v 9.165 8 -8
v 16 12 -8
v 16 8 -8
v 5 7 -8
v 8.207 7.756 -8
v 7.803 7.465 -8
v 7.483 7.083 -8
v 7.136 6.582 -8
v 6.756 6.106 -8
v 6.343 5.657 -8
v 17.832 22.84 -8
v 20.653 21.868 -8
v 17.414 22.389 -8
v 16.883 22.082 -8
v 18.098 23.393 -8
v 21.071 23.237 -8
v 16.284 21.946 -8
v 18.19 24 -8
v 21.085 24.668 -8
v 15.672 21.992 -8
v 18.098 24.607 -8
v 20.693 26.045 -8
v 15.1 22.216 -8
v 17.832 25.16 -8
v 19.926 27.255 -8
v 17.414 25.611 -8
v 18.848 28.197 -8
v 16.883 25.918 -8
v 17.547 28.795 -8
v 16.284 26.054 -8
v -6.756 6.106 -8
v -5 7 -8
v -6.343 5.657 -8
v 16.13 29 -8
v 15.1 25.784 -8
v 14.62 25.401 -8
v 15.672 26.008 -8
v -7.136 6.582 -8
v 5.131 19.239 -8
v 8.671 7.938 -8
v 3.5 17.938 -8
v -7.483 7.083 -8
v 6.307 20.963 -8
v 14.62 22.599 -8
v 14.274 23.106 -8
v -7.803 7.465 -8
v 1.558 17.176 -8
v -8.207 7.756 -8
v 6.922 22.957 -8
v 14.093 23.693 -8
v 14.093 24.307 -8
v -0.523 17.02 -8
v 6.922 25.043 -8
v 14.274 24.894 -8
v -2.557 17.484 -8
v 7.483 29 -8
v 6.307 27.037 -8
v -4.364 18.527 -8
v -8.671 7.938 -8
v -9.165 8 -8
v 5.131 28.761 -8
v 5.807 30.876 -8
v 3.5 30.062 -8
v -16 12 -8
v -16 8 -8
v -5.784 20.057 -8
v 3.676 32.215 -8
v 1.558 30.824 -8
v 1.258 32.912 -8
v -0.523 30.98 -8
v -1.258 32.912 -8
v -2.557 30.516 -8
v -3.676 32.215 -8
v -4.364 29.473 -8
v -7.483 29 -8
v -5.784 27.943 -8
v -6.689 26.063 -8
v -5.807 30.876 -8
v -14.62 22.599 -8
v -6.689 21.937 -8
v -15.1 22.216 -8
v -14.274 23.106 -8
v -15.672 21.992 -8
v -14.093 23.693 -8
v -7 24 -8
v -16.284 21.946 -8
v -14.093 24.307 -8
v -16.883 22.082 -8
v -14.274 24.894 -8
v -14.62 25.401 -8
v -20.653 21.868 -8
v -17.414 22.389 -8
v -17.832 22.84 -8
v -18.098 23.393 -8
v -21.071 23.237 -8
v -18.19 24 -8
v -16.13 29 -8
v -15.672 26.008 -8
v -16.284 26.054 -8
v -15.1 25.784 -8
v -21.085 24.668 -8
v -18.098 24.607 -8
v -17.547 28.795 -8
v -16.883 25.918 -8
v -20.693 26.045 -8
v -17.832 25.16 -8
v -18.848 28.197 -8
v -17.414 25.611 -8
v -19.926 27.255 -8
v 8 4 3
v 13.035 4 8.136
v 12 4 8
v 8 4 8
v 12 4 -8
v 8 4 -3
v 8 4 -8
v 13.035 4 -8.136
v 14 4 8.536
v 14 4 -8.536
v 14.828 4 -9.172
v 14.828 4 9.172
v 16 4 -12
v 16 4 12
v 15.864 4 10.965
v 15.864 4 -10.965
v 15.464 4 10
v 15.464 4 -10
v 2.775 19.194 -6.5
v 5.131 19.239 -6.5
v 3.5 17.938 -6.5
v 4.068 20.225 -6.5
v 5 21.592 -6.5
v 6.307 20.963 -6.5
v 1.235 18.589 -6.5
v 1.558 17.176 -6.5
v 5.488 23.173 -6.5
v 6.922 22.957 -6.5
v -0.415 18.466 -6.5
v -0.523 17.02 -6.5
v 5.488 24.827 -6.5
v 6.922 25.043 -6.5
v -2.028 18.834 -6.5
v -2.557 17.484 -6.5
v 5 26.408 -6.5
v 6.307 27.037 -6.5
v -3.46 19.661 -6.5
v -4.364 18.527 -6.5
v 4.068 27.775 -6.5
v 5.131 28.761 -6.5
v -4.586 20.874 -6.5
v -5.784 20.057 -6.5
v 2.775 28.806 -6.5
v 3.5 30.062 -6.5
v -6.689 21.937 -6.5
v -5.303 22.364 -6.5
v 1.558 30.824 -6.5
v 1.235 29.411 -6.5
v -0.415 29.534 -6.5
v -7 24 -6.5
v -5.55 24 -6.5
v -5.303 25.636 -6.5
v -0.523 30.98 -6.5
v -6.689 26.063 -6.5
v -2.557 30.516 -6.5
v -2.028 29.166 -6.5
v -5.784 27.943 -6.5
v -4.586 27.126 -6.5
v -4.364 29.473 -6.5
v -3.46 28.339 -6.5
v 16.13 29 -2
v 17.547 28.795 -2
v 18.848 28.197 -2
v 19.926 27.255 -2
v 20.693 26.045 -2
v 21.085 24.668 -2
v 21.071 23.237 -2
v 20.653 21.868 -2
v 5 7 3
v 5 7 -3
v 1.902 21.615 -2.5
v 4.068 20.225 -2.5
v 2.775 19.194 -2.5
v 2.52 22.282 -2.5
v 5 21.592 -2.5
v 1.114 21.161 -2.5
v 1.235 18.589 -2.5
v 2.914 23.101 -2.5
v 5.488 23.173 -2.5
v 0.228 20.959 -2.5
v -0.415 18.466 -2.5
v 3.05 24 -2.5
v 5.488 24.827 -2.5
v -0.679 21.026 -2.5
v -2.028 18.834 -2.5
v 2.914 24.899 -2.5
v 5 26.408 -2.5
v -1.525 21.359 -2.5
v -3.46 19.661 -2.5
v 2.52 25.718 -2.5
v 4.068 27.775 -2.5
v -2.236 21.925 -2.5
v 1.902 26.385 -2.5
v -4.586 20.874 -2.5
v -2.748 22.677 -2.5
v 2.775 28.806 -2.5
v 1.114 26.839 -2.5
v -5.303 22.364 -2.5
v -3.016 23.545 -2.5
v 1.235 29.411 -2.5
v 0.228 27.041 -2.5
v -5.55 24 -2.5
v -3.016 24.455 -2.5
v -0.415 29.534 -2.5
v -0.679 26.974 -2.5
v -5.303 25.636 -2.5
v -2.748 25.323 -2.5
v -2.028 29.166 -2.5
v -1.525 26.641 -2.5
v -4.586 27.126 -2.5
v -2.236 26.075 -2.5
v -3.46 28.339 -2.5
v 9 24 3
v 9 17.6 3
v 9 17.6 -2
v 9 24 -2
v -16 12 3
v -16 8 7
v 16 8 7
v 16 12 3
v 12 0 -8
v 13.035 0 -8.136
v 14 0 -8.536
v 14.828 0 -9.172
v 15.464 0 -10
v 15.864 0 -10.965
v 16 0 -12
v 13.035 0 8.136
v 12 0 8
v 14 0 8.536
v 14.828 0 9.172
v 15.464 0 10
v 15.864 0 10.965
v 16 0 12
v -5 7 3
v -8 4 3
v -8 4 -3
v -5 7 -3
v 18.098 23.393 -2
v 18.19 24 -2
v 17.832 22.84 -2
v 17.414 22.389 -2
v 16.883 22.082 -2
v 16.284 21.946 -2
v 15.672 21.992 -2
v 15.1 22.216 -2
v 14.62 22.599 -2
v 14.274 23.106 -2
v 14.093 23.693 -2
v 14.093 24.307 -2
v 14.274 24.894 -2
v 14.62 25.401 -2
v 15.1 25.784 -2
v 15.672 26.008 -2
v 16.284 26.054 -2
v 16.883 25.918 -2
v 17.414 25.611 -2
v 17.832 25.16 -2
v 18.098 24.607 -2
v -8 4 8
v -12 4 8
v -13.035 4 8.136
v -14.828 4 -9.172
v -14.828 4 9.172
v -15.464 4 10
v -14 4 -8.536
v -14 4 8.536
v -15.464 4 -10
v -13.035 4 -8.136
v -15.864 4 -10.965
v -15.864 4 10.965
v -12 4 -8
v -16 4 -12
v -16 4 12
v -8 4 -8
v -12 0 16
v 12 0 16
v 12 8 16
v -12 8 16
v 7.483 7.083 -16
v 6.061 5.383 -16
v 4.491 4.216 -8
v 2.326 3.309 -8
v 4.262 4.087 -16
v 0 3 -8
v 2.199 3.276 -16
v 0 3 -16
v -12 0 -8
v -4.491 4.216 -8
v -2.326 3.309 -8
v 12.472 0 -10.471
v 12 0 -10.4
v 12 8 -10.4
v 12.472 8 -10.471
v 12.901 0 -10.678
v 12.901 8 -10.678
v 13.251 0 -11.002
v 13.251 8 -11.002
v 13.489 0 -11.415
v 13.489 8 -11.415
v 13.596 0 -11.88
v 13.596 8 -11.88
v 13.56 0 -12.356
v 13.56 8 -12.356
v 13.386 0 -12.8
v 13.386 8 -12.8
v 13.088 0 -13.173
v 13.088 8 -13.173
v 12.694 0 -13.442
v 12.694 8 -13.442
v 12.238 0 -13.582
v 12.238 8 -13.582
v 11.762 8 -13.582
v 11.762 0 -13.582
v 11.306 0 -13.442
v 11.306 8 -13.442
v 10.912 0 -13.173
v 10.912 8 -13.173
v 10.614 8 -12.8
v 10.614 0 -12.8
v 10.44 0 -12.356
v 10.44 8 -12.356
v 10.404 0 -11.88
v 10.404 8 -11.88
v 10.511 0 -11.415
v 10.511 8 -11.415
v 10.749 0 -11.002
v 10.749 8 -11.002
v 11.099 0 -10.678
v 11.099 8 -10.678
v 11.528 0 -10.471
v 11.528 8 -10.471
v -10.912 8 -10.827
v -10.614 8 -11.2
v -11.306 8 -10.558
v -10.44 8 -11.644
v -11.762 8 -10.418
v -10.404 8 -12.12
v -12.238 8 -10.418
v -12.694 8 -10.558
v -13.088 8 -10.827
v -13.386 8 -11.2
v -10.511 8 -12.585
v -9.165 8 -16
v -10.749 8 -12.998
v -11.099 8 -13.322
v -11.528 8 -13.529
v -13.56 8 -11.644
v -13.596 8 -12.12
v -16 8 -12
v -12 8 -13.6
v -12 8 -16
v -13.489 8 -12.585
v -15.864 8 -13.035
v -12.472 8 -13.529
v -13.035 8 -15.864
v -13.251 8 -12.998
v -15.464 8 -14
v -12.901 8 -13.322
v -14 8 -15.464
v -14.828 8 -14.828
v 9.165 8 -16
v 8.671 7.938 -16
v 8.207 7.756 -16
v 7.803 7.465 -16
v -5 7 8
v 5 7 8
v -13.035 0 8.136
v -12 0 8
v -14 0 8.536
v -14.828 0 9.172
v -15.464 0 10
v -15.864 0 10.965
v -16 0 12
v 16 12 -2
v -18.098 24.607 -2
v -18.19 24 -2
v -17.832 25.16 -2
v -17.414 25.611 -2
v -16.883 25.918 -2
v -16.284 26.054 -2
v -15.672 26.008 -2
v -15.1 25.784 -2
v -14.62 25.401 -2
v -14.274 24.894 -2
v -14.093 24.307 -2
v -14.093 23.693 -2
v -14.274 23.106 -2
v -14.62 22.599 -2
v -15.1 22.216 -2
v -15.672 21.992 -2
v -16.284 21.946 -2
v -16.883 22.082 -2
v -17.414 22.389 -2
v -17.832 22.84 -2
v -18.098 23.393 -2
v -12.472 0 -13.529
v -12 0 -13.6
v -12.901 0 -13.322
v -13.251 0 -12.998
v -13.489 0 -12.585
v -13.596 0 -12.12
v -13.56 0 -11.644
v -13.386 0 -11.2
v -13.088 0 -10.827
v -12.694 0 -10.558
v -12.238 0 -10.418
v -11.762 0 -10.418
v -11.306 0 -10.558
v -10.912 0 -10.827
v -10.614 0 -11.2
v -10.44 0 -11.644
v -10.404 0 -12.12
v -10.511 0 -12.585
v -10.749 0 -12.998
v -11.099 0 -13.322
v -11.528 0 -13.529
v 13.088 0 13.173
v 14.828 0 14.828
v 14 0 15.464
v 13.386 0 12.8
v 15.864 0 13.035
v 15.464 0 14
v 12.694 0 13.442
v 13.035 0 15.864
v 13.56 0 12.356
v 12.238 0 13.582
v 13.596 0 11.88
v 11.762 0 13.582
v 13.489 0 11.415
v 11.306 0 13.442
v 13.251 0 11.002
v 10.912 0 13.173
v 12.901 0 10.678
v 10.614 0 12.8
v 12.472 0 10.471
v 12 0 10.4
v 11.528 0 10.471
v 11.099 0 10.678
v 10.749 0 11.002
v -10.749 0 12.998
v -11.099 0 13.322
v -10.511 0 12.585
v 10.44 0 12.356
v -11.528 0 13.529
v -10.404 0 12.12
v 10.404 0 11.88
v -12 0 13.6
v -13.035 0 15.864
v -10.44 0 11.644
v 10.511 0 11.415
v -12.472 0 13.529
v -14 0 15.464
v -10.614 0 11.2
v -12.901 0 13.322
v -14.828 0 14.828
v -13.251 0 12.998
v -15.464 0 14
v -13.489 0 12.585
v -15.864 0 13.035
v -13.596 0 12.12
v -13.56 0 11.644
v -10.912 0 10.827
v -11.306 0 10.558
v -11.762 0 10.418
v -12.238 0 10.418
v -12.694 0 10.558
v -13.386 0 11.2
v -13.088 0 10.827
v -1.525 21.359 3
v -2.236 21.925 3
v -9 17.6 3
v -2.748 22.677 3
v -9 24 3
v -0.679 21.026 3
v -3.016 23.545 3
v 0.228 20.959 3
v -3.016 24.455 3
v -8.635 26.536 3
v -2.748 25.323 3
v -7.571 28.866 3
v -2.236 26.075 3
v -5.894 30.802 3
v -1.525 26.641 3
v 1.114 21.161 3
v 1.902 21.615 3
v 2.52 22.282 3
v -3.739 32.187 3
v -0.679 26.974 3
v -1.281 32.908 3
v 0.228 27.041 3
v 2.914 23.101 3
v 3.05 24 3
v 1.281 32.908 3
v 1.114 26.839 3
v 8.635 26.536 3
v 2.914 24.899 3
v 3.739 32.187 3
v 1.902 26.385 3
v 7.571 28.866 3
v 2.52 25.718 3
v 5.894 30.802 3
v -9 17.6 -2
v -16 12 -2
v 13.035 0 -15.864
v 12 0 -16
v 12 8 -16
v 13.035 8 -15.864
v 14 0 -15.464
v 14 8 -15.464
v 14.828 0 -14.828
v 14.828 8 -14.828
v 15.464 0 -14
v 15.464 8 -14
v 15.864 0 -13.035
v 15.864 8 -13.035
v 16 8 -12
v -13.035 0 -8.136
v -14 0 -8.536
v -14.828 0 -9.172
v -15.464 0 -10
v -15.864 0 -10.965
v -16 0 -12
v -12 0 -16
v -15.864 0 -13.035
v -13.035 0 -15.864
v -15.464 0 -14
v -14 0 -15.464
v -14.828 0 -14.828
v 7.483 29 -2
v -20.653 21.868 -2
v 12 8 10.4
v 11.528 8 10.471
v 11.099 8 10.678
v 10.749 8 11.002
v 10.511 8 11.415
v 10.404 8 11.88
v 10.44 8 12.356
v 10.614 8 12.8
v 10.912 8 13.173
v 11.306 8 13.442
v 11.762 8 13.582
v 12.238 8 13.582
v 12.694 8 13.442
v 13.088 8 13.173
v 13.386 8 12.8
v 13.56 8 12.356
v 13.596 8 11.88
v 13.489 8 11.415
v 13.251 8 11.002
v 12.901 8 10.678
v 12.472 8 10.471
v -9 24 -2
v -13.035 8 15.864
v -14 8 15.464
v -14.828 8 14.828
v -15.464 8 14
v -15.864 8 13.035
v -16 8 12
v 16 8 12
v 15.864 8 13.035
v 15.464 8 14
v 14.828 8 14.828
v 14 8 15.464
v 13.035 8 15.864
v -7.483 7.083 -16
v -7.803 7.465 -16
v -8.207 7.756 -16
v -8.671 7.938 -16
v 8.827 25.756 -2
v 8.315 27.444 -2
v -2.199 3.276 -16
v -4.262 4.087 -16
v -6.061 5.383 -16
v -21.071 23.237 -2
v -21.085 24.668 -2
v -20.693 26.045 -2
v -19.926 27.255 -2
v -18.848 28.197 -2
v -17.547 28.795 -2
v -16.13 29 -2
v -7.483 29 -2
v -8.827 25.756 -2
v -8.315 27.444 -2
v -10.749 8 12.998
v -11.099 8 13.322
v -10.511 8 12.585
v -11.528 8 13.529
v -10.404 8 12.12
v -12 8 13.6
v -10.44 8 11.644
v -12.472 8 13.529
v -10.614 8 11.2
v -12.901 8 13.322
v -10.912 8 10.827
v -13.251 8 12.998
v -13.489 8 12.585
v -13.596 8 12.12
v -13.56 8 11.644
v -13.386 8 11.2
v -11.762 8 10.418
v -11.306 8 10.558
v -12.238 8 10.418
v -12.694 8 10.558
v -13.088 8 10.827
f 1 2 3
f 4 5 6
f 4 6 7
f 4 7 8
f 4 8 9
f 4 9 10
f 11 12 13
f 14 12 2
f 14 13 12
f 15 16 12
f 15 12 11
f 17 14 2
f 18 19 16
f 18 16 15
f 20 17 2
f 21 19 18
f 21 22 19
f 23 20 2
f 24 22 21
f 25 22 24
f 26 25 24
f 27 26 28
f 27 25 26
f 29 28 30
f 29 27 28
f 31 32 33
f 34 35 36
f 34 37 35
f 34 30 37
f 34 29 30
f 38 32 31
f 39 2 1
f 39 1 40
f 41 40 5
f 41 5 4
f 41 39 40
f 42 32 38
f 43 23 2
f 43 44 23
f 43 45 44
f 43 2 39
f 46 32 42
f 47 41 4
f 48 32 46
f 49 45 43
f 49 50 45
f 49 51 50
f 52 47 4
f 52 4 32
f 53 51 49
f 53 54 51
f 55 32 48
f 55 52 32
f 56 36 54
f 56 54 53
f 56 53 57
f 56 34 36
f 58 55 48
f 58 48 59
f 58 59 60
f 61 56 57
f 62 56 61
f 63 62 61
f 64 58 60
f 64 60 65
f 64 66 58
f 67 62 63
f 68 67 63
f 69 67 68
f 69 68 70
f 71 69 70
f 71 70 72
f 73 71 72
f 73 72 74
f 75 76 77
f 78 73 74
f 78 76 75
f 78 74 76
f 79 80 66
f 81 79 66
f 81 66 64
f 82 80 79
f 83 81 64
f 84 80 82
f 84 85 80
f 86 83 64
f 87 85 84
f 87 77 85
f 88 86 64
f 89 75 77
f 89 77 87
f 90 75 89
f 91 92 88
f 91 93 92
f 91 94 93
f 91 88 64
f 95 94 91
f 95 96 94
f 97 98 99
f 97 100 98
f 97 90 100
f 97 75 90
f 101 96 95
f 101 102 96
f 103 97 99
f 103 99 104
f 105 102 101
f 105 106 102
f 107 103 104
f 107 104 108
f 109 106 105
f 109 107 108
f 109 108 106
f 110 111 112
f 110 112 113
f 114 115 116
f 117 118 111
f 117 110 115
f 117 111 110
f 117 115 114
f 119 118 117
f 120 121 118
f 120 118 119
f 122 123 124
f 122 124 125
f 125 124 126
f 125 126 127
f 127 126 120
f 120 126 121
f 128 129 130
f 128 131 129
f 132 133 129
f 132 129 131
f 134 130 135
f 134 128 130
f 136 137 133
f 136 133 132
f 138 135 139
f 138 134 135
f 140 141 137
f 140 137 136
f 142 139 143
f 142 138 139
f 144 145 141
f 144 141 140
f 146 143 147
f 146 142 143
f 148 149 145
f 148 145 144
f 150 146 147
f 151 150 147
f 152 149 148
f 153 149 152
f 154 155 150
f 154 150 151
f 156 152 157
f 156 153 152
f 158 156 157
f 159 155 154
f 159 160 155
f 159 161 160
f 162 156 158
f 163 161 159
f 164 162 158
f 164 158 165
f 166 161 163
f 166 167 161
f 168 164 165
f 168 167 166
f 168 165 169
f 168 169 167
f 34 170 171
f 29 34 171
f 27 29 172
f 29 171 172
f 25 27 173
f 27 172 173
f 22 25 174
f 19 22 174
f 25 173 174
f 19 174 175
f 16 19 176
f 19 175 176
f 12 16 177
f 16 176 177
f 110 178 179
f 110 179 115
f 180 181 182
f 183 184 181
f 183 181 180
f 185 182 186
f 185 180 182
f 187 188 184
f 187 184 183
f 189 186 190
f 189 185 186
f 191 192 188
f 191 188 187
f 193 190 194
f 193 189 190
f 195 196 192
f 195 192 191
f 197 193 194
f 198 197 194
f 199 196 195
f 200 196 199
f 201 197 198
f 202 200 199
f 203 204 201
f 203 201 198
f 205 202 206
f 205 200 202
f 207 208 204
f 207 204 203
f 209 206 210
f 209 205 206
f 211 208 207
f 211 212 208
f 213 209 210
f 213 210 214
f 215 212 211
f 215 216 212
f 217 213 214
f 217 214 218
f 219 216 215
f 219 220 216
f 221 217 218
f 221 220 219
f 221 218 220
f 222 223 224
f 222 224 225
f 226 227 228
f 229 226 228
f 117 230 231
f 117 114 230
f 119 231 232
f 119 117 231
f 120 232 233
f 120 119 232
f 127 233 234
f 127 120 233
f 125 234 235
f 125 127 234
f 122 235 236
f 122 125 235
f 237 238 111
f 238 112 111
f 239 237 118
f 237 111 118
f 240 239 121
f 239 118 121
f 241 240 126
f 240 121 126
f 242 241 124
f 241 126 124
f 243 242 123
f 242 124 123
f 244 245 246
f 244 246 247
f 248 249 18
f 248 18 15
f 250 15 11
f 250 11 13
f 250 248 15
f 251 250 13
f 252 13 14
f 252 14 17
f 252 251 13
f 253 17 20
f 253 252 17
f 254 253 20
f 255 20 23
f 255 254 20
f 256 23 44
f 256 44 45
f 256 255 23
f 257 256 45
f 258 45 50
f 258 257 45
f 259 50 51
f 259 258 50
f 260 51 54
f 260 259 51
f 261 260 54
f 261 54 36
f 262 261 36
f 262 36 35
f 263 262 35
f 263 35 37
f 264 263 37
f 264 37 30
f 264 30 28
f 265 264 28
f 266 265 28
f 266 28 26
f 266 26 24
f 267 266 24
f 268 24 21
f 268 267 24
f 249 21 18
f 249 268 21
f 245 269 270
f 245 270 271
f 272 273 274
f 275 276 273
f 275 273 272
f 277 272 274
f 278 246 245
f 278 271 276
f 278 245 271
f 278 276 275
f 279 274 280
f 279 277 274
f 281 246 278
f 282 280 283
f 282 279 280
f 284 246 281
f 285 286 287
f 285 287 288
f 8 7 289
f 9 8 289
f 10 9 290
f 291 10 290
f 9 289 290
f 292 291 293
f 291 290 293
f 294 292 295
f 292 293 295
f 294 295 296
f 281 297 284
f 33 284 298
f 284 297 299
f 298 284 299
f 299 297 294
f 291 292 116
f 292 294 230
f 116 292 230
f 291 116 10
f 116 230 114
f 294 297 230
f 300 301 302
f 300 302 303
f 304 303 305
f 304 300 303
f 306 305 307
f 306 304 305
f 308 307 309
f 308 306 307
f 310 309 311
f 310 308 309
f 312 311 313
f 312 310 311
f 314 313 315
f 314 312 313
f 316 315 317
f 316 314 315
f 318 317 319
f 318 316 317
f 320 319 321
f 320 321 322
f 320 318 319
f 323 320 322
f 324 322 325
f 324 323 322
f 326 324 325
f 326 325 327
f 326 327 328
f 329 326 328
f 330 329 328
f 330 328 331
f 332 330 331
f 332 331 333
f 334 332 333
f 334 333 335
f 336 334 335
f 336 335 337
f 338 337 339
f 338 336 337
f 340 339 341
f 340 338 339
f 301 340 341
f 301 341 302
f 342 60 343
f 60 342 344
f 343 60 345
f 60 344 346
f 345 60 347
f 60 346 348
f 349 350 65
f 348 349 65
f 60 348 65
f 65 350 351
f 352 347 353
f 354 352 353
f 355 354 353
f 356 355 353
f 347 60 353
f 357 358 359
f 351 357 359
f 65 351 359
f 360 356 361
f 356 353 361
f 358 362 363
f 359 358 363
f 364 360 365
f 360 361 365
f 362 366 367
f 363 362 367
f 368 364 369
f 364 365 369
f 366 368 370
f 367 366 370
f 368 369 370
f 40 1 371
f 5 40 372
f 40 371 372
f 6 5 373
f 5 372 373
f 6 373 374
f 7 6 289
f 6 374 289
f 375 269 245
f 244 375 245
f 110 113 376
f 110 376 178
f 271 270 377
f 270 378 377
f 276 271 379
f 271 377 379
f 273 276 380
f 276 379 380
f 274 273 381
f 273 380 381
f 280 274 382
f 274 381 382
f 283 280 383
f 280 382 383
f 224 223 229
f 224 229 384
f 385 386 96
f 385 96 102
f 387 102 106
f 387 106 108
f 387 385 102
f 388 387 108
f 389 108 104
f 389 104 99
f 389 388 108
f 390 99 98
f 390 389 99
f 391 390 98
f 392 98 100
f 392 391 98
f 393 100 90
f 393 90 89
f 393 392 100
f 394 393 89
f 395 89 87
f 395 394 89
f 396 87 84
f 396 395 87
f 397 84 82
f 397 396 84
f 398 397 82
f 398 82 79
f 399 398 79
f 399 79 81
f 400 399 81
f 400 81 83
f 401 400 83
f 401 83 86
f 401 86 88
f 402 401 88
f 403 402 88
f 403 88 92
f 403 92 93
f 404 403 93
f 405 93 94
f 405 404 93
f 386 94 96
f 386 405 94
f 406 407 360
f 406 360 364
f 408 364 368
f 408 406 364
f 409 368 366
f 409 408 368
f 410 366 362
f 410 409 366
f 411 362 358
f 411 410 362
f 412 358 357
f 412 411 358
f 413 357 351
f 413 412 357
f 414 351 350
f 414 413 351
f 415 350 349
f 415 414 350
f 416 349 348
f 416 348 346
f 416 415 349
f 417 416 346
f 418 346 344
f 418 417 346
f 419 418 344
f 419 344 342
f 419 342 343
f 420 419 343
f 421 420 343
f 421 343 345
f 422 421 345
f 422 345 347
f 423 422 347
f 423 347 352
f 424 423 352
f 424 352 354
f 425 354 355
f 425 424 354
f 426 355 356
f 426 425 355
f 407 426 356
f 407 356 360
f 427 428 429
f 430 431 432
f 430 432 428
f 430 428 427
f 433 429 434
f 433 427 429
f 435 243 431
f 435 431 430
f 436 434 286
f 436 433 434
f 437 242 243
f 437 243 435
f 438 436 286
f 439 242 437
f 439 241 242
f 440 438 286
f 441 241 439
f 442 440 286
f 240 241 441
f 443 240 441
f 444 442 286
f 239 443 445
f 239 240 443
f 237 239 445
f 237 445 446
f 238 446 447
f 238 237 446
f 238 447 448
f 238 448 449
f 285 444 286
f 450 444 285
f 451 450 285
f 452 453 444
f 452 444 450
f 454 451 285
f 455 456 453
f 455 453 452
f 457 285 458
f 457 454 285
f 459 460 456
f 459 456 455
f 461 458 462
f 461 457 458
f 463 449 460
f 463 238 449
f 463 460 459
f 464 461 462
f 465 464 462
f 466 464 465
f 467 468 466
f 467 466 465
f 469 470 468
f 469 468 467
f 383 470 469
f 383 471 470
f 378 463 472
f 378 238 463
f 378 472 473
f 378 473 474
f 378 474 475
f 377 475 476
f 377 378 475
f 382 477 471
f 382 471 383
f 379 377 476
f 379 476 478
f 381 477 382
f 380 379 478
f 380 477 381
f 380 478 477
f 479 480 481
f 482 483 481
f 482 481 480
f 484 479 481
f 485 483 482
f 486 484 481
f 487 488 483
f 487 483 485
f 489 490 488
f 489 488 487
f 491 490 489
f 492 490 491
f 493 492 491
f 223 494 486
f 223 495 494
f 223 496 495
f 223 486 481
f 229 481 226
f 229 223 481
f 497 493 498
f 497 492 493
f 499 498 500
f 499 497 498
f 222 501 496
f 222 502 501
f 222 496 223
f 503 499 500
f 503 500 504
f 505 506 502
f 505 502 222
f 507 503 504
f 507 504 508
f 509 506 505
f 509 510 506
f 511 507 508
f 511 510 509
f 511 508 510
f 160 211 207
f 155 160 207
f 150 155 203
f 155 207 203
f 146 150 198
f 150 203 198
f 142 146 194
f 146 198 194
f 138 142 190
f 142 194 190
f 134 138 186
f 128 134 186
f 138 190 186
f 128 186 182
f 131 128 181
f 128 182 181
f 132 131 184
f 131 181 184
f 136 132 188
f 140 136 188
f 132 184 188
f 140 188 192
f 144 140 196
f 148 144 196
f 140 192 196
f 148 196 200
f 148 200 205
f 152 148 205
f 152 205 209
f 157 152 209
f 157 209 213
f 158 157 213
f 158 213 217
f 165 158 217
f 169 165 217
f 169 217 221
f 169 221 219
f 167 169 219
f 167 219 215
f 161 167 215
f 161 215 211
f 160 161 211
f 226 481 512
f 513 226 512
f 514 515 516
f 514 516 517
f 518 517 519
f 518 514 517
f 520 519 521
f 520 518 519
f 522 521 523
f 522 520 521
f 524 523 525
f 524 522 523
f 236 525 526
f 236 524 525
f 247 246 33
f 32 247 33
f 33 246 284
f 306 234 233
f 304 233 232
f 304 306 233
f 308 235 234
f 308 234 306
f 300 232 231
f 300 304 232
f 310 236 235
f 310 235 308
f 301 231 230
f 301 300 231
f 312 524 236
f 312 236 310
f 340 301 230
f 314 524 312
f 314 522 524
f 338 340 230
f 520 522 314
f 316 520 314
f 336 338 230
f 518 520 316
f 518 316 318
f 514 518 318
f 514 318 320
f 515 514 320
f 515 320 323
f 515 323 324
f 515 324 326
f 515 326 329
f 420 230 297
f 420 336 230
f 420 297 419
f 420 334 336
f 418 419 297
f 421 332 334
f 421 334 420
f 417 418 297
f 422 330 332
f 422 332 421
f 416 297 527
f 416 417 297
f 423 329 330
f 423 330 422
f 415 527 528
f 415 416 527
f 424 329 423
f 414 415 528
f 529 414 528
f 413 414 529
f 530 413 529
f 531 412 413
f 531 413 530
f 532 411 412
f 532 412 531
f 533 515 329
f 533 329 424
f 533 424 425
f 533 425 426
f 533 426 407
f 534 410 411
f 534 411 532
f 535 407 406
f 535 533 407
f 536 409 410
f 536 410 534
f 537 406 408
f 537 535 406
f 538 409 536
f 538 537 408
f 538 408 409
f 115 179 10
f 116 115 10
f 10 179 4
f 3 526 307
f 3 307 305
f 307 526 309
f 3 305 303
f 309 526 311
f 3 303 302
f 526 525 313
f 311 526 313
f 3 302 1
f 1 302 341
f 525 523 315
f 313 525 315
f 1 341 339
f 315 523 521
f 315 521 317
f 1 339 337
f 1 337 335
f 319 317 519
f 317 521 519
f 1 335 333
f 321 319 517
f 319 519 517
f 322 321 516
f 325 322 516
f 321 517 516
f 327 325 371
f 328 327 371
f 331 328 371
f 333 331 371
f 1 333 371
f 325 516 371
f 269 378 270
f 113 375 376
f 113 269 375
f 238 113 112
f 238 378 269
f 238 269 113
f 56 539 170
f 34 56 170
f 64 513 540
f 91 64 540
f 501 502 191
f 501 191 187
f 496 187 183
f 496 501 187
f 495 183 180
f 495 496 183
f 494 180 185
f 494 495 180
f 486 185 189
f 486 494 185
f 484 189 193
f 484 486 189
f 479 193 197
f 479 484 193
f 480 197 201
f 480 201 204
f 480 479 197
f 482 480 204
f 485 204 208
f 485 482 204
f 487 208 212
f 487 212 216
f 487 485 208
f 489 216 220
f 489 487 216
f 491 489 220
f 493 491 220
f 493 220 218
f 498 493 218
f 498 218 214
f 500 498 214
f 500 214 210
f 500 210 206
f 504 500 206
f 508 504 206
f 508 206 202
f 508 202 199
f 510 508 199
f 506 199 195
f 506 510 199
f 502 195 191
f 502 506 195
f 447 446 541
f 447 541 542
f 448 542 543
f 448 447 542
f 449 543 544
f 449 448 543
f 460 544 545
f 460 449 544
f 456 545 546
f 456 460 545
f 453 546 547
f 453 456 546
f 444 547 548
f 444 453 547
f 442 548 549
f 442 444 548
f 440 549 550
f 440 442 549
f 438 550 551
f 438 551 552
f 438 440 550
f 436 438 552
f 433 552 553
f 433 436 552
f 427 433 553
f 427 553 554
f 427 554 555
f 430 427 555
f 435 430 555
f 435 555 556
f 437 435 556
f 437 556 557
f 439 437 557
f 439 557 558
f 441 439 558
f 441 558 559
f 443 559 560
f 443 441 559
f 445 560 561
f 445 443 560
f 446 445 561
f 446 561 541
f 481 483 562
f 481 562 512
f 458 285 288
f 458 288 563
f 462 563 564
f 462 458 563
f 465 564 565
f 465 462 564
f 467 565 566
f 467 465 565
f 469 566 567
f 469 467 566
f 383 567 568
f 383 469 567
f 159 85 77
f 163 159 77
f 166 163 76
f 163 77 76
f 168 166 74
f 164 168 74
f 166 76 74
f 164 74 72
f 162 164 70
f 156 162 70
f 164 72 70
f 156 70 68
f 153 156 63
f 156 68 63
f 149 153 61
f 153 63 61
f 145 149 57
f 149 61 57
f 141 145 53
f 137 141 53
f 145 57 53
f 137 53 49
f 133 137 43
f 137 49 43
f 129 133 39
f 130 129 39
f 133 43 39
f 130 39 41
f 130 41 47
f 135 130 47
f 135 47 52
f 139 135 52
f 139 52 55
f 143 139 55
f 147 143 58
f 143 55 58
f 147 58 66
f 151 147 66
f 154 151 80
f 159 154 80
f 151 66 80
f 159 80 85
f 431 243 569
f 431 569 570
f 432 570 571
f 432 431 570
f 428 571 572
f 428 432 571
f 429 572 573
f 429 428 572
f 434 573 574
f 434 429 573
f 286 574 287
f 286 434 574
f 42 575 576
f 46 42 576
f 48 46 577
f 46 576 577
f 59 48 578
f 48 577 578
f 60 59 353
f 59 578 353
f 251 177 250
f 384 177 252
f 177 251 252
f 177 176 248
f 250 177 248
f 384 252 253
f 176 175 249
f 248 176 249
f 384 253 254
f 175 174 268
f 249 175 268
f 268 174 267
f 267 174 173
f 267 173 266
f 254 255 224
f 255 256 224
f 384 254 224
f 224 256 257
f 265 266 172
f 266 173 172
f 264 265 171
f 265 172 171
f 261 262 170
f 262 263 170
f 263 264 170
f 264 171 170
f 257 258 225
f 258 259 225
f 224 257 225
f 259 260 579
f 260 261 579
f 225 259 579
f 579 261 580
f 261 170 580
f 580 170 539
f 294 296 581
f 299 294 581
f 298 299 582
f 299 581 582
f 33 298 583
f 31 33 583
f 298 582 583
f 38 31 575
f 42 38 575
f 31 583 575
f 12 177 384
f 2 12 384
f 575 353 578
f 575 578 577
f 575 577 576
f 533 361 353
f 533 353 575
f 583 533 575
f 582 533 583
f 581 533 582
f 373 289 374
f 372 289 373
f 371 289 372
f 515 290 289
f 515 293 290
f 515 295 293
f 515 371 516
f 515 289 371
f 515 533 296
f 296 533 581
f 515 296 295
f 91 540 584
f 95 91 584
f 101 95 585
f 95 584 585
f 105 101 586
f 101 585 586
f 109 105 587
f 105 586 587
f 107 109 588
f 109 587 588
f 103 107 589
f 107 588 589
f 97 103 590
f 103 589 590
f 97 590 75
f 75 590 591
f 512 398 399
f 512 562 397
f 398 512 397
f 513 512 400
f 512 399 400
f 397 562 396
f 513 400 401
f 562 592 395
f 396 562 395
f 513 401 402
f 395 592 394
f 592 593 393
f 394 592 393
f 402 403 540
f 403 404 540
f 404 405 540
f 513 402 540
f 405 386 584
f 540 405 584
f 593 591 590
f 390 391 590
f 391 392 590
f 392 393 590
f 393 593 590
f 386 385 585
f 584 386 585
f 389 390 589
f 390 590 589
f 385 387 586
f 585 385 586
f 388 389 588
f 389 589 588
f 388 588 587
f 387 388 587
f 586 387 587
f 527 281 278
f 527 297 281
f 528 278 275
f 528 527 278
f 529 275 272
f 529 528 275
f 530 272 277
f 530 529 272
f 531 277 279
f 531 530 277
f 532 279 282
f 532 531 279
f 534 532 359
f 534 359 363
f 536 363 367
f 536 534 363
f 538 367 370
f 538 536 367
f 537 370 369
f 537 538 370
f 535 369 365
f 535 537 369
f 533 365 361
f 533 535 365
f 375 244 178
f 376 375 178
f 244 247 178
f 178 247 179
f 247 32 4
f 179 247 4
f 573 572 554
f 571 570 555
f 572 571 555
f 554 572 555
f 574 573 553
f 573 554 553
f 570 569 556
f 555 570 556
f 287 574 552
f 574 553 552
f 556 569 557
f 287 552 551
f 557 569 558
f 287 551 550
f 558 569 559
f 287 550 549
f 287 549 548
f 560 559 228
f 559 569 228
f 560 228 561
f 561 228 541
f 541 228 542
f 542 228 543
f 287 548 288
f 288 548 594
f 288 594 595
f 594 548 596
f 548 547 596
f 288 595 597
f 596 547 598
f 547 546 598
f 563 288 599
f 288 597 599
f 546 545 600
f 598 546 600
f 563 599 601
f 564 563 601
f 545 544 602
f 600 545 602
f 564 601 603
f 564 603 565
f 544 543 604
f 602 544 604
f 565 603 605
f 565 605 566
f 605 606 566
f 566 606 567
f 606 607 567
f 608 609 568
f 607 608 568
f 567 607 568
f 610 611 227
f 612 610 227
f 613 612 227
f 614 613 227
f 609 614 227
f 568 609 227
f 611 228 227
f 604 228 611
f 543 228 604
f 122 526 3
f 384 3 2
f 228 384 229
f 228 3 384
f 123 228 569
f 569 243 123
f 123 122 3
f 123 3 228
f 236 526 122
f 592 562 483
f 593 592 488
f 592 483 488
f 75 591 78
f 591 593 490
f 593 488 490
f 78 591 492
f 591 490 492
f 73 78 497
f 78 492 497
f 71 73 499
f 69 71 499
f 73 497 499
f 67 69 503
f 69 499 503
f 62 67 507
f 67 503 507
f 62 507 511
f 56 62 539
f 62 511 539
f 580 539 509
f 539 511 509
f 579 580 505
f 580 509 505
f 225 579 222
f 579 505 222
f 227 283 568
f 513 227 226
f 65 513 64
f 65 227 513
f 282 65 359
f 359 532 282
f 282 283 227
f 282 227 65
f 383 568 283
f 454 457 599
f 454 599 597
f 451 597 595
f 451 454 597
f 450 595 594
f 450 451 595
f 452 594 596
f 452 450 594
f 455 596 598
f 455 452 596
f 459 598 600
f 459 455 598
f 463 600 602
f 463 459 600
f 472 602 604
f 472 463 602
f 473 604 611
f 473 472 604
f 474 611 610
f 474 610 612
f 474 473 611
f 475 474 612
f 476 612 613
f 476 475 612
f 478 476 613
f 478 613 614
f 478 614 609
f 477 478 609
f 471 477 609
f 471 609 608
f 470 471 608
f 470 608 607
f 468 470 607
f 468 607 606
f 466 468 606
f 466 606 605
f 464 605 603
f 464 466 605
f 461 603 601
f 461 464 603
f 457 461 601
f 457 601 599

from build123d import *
from OCP.BRepFilletAPI import BRepFilletAPI_MakeChamfer
from build123d.topology import SkipClean

# Parameters (mm, degrees)
SKETCH1_R                = 1.6
SKETCH1_W                = 16
SKETCH1_H                = 16
BOSS_EXTRUDE1_DEPTH      = 8
SKETCH2_W                = 16
SKETCH2_H                = 4
CUT_EXTRUDE1_DEPTH       = 40
FILLET1_R                = 4
BOSS_EXTRUDE5_DEPTH      = 12
BOSS_EXTRUDE5_DEPTH_BACK = 1
SKETCH3_W                = 32
SKETCH3_H                = 5
CHAMFER1_SIZE            = 3
CHAMFER2_SIZE            = 8
CHAMFER2_SIZE2           = 10
SKETCH5_W                = 12
SKETCH5_H                = 5
BOSS_EXTRUDE7_DEPTH      = 8
FILLET2_R                = 4
SKETCH6_R                = 1.6
CUT_EXTRUDE2_DEPTH       = 20
SKETCH7_R                = 3.05
CUT_EXTRUDE3_DEPTH       = 9
SKETCH8_R                = 3.05
BOSS_EXTRUDE8_DEPTH      = 5
BOSS_EXTRUDE9_START      = -5
SKETCH9_R                = 1.6
BOSS_EXTRUDE9_DEPTH      = 5
SKETCH10_R               = 5.55
CUT_EXTRUDE4_DEPTH       = 9
BOSS_EXTRUDE11_START     = 6
SKETCH11_R               = 5.55
BOSS_EXTRUDE11_DEPTH     = 6
SKETCH12_R               = 7.71946315
SKETCH12_R_2             = 3.05
BOSS_EXTRUDE12_DEPTH     = 5.5
SKETCH14_R               = 7
CUT_EXTRUDE6_DEPTH       = 1.5
CUT_EXTRUDE8_DEPTH       = 5
BOSS_EXTRUDE13_START     = -6
SKETCH19_R               = 2.06
SKETCH19_R_2             = 7
BOSS_EXTRUDE13_DEPTH     = 6
CUT_EXTRUDE9_DEPTH       = 8
FILLET3_R                = 2
CHAMFER3_SIZE            = 4


# Some blends are built 0.0001 mm under size
with BuildPart() as part:
    # Sketch1 → Boss-Extrude1 (new body)
    with BuildSketch(Plane(origin=(0, 0, 0), x_dir=(1, 0, 0), z_dir=(0, 1, 0))):
        with BuildLine():
            Line((-12, 16), (12, 16))
            ThreePointArc((12, 16), (14.828427125, 14.828427125), (16, 12))
            Line((16, 12), (16, -12))
            ThreePointArc((16, -12), (14.828427125, -14.828427125), (12, -16))
            Line((12, -16), (-12, -16))
            ThreePointArc((-12, -16), (-14.828427125, -14.828427125), (-16, -12))
            Line((-16, -12), (-16, 12))
            ThreePointArc((-16, 12), (-14.828427125, 14.828427125), (-12, 16))
        make_face()
        with Locations(Location((12, 12, 0), (0, 0, 270))):
            Circle(SKETCH1_R, mode=Mode.SUBTRACT)
        with Locations(Location((-12, 12, 0), (0, 0, 90))):
            Circle(SKETCH1_R, mode=Mode.SUBTRACT)
        with Locations(Location((12, -12, 0), (0, 0, 90))):
            Circle(SKETCH1_R, mode=Mode.SUBTRACT)
        with Locations(Location((-12, -12, 0), (0, 0, 270))):
            Circle(SKETCH1_R, mode=Mode.SUBTRACT)
        Rectangle(SKETCH1_W, SKETCH1_H, mode=Mode.SUBTRACT)
    extrude(amount=BOSS_EXTRUDE1_DEPTH)

    # Sketch2 → Cut-Extrude1 (cut)
    with BuildSketch(Plane(origin=(16, 0, 0), x_dir=(0, 0, -1), z_dir=(1, 0, 0))):
        with Locations((0, 2)):
            Rectangle(SKETCH2_W, SKETCH2_H)
    extrude(amount=-CUT_EXTRUDE1_DEPTH, mode=Mode.SUBTRACT)

    # Fillet1
    fillet1_edges = [part.edges().sort_by_distance(p)[0] for p in [
        (-16, 2, -8),
        (16, 2, -8),
        (-16, 2, 8),
        (16, 2, 8),
    ]]
    fillet(fillet1_edges, radius=FILLET1_R - 0.0001)  # a hair under: the kernel refuses the full size

    # Sketch3 → Boss-Extrude5 (add, two sides: drawn at the far end of the back side and taken through both)
    with BuildSketch(Plane(origin=(0, 8, 0), x_dir=(1, 0, 0), z_dir=(0, 1, 0)).offset(-BOSS_EXTRUDE5_DEPTH_BACK)):
        with Locations((0, 5.5)):
            Rectangle(SKETCH3_W, SKETCH3_H)
        with Locations((0, -5.5)):
            Rectangle(SKETCH3_W, SKETCH3_H)
    extrude(amount=BOSS_EXTRUDE5_DEPTH + BOSS_EXTRUDE5_DEPTH_BACK)

    # Chamfer1
    chamfer1_edges = [part.edges().sort_by_distance(p)[0] for p in [
        (8, 7, 5.5),
        (8, 7, -5.5),
        (-8, 7, -5.5),
        (-8, 7, 5.5),
    ]]
    chamfer(chamfer1_edges, length=CHAMFER1_SIZE - 0.0001)  # a hair under: the kernel refuses the full size

    # Chamfer2: one chamfer whose edges measure the first distance from different faces: ONE call of the kernel's chamfer builder (chamfer() names one face for all edges)
    chamfer2_edges_1 = [part.edges().sort_by_distance(p)[0] for p in [
        (-16, 20, -5.5),
        (-16, 20, 5.5),
    ]]
    chamfer2_side_1 = [part.faces().sort_by_distance(p)[0] for p in [
        (-16, 0.312409987, 11.99995),
    ]]
    chamfer2_edges_2 = [part.edges().sort_by_distance(p)[0] for p in [
        (16, 20, -5.5),
        (16, 20, 5.5),
    ]]
    chamfer2_side_2 = [part.faces().sort_by_distance(p)[0] for p in [
        (16, 0.312409987, -11.99995),
    ]]
    chamfer2 = BRepFilletAPI_MakeChamfer(part.part.solid().wrapped)
    for e in chamfer2_edges_1:
        chamfer2.Add(CHAMFER2_SIZE, CHAMFER2_SIZE2, e.wrapped, chamfer2_side_1[0].wrapped)  # the first distance lies on this face
    for e in chamfer2_edges_2:
        chamfer2.Add(CHAMFER2_SIZE, CHAMFER2_SIZE2, e.wrapped, chamfer2_side_2[0].wrapped)  # the first distance lies on this face
    add(Compound.cast(chamfer2.Shape()), mode=Mode.REPLACE)

    # Sketch5 → Boss-Extrude7 (add)
    with BuildSketch(Plane(origin=(0, 20, 0), x_dir=(1, 0, 0), z_dir=(0, 1, 0))):
        with Locations((0, 5.5)):
            Rectangle(SKETCH5_W, SKETCH5_H)
        with Locations((0, -5.5)):
            Rectangle(SKETCH5_W, SKETCH5_H)
    extrude(amount=BOSS_EXTRUDE7_DEPTH)

    # Fillet2
    fillet2_edges = [part.edges().sort_by_distance(p)[0] for p in [
        (-6, 28, -5.5),
        (6, 28, -5.5),
        (-6, 28, 5.5),
        (6, 28, 5.5),
    ]]
    fillet(fillet2_edges, radius=FILLET2_R)

    # Sketch6 → Cut-Extrude2 (cut)
    with BuildSketch(Plane.XY.offset(8)):
        with Locations((0, 24)):
            Circle(SKETCH6_R)
    extrude(amount=-CUT_EXTRUDE2_DEPTH, mode=Mode.SUBTRACT)

    # Sketch7 → Cut-Extrude3 (cut)
    with BuildSketch(Plane.XY.offset(8)):
        with Locations((0, 24)):
            Circle(SKETCH7_R)
    extrude(amount=-CUT_EXTRUDE3_DEPTH, mode=Mode.SUBTRACT)

    # Sketch8 → Boss-Extrude8 (add)
    with BuildSketch(Plane.XY.offset(8)):
        with BuildLine():
            Line((-9, 24), (-9, 15))
            Line((-9, 15), (0, 15))
            Line((0, 15), (9, 15))
            Line((9, 15), (9, 24))
            ThreePointArc((9, 24), (0, 33), (-9, 24))
        make_face()
        with Locations((0, 24)):
            Circle(SKETCH8_R, mode=Mode.SUBTRACT)
    extrude(amount=-BOSS_EXTRUDE8_DEPTH)

    # Sketch9 → Boss-Extrude9 (add)
    with BuildSketch(Plane(origin=(0, 0, -8), x_dir=(-1, 0, 0), z_dir=(0, 0, -1)).offset(BOSS_EXTRUDE9_START)):
        with BuildLine():
            Line((-9, 24), (-9, 11))
            Line((-9, 11), (9, 11))
            Line((9, 11), (9, 24))
            ThreePointArc((9, 24), (0, 33), (-9, 24))
        make_face()
        with Locations(Location((0, 24, 0), (0, 0, 180))):
            Circle(SKETCH9_R, mode=Mode.SUBTRACT)
    extrude(amount=BOSS_EXTRUDE9_DEPTH)

    # Sketch10 → Cut-Extrude4 (cut)
    with BuildSketch(Plane(origin=(0, 0, -8), x_dir=(-1, 0, 0), z_dir=(0, 0, -1))):
        with Locations((0, 24)):
            Circle(SKETCH10_R)
    extrude(amount=-CUT_EXTRUDE4_DEPTH, mode=Mode.SUBTRACT)

    # Sketch11 → Boss-Extrude11 (add)
    with SkipClean():  # the faces are left unmerged after this step: merging them gives an invalid solid
        with BuildSketch(Plane.XY.offset(-3).offset(BOSS_EXTRUDE11_START)):
            with BuildLine():
                Line((-9, 24), (-9, 17.6))
                Line((-9, 17.6), (-16, 12))
                Line((-16, 12), (-16, 8))
                Line((-16, 8), (-8, 8))
                Line((-8, 8), (-8, 4))
                Line((-8, 4), (-5, 7))
                Line((-5, 7), (5, 7))
                Line((5, 7), (8, 4))
                Line((8, 4), (8, 8))
                Line((8, 8), (16, 8))
                Line((16, 8), (16, 12))
                Line((16, 12), (9, 17.6))
                Line((9, 17.6), (9, 24))
                ThreePointArc((9, 24), (0, 33), (-9, 24))
            make_face()
            with Locations(Location((0, 24, 0), (0, 0, 180))):
                Circle(SKETCH11_R, mode=Mode.SUBTRACT)
        extrude(amount=-BOSS_EXTRUDE11_DEPTH)

    # Sketch12 → Boss-Extrude12 (add)
    with BuildSketch(Plane(origin=(0, 0, 3), x_dir=(-1, 0, 0), z_dir=(0, 0, -1))):
        with Locations((0, 24)):
            Circle(SKETCH12_R)
        with Locations(Location((0, 24, 0), (0, 0, 180))):
            Circle(SKETCH12_R_2, mode=Mode.SUBTRACT)
    extrude(amount=BOSS_EXTRUDE12_DEPTH)

    # Sketch14 → Cut-Extrude6 (cut)
    with BuildSketch(Plane(origin=(0, 0, -8), x_dir=(-1, 0, 0), z_dir=(0, 0, -1))):
        with Locations((0, 24)):
            Circle(SKETCH14_R)
    extrude(amount=-CUT_EXTRUDE6_DEPTH, mode=Mode.SUBTRACT)

    # Sketch16 → Cut-Extrude8 (cut)
    with SkipClean():  # the faces are left unmerged after this step: merging them gives an invalid solid
        with BuildSketch(Plane.XY.offset(8)):
            Polygon((-16, 8), (16, 8), (29.507054263, 32.870046285), (-4.901166162, 51.167615183), (-28.978076235, 29.234025221), align=None)
        extrude(amount=-CUT_EXTRUDE8_DEPTH, mode=Mode.SUBTRACT)

    # Sketch19 → Boss-Extrude13 (add)
    with SkipClean():  # the faces are left unmerged after this step: merging them gives an invalid solid
        with BuildSketch(Plane(origin=(0, 0, -8), x_dir=(-1, 0, 0), z_dir=(0, 0, -1)).offset(BOSS_EXTRUDE13_START)):
            with BuildLine():
                Line((16.13, 29), (7.483314774, 29))
                ThreePointArc((7.483314774, 29), (0, 33), (-7.483314774, 29))
                Line((-7.483314774, 29), (-16.13, 29))
                ThreePointArc((-16.13, 29), (-20.352655353, 26.677532777), (-20.652519245, 21.867672708))
                Line((-20.652519245, 21.867672708), (-16, 12))
                Line((-16, 12), (16, 12))
                Line((16, 12), (20.652519245, 21.867672708))
                ThreePointArc((20.652519245, 21.867672708), (20.352655353, 26.677532777), (16.13, 29))
            make_face()
            with Locations((16.13, 24)):
                Circle(SKETCH19_R, mode=Mode.SUBTRACT)
            with Locations(Location((-16.13, 24, 0), (0, 0, 180))):
                Circle(SKETCH19_R, mode=Mode.SUBTRACT)
            with Locations((0, 24)):
                Circle(SKETCH19_R_2, mode=Mode.SUBTRACT)
        extrude(amount=BOSS_EXTRUDE13_DEPTH)

    # Sketch21 → Cut-Extrude9 (cut)
    with SkipClean():  # the faces are left unmerged after this step: merging them gives an invalid solid
        with BuildSketch(Plane(origin=(0, 0, -16), x_dir=(-1, 0, 0), z_dir=(0, 0, -1))):
            with BuildLine():
                Line((8, 8), (0, 8))
                Line((0, 8), (0, 3))
                ThreePointArc((0, 3), (4.716990566, 4.352815094), (8, 8))
            make_face()
            with BuildLine():
                Line((0, 3), (0, 8))
                Line((0, 8), (-8, 8))
                ThreePointArc((-8, 8), (-4.716990566, 4.352815094), (0, 3))
            make_face()
        extrude(amount=-CUT_EXTRUDE9_DEPTH, mode=Mode.SUBTRACT)

    # Fillet3
    # the kernel refuses this fillet: 2 mm, written as the material it takes off along each edge
    with BuildSketch(Plane(origin=(8, 8, -18.912878475), x_dir=(1, 0, 0), z_dir=(0, 0, 1))) as fillet3_piece_1:
        with BuildLine():
            CenterArc((1.16515139, -2), FILLET3_R, 90, 57.22888336)
            ThreePointArc((-0.516527764, -0.917431193), (-0.244685814, -0.466360256), (0, 0))
            Line((0, 0), (1.16515139, 0))
        make_face()
    extrude(amount=10.912878475, mode=Mode.SUBTRACT)
    with BuildSketch(Plane(origin=(-8, 8, -18.912878475), x_dir=(-1, 0, 0), z_dir=(0, 0, 1))) as fillet3_piece_2:
        with BuildLine():
            CenterArc((1.16515139, 2), FILLET3_R, 212.77111664, 57.22888336)
            ThreePointArc((-0.516527764, 0.917431193), (-0.244685814, 0.466360256), (0, 0))
            Line((0, 0), (1.16515139, 0))
        make_face()
    extrude(amount=10.912878475, mode=Mode.SUBTRACT)

    # Chamfer3
    chamfer3_edges = [part.edges().sort_by_distance(p)[0] for p in [
        (0, 8, 3),
    ]]
    chamfer(chamfer3_edges, length=CHAMFER3_SIZE)


solid = part.part
